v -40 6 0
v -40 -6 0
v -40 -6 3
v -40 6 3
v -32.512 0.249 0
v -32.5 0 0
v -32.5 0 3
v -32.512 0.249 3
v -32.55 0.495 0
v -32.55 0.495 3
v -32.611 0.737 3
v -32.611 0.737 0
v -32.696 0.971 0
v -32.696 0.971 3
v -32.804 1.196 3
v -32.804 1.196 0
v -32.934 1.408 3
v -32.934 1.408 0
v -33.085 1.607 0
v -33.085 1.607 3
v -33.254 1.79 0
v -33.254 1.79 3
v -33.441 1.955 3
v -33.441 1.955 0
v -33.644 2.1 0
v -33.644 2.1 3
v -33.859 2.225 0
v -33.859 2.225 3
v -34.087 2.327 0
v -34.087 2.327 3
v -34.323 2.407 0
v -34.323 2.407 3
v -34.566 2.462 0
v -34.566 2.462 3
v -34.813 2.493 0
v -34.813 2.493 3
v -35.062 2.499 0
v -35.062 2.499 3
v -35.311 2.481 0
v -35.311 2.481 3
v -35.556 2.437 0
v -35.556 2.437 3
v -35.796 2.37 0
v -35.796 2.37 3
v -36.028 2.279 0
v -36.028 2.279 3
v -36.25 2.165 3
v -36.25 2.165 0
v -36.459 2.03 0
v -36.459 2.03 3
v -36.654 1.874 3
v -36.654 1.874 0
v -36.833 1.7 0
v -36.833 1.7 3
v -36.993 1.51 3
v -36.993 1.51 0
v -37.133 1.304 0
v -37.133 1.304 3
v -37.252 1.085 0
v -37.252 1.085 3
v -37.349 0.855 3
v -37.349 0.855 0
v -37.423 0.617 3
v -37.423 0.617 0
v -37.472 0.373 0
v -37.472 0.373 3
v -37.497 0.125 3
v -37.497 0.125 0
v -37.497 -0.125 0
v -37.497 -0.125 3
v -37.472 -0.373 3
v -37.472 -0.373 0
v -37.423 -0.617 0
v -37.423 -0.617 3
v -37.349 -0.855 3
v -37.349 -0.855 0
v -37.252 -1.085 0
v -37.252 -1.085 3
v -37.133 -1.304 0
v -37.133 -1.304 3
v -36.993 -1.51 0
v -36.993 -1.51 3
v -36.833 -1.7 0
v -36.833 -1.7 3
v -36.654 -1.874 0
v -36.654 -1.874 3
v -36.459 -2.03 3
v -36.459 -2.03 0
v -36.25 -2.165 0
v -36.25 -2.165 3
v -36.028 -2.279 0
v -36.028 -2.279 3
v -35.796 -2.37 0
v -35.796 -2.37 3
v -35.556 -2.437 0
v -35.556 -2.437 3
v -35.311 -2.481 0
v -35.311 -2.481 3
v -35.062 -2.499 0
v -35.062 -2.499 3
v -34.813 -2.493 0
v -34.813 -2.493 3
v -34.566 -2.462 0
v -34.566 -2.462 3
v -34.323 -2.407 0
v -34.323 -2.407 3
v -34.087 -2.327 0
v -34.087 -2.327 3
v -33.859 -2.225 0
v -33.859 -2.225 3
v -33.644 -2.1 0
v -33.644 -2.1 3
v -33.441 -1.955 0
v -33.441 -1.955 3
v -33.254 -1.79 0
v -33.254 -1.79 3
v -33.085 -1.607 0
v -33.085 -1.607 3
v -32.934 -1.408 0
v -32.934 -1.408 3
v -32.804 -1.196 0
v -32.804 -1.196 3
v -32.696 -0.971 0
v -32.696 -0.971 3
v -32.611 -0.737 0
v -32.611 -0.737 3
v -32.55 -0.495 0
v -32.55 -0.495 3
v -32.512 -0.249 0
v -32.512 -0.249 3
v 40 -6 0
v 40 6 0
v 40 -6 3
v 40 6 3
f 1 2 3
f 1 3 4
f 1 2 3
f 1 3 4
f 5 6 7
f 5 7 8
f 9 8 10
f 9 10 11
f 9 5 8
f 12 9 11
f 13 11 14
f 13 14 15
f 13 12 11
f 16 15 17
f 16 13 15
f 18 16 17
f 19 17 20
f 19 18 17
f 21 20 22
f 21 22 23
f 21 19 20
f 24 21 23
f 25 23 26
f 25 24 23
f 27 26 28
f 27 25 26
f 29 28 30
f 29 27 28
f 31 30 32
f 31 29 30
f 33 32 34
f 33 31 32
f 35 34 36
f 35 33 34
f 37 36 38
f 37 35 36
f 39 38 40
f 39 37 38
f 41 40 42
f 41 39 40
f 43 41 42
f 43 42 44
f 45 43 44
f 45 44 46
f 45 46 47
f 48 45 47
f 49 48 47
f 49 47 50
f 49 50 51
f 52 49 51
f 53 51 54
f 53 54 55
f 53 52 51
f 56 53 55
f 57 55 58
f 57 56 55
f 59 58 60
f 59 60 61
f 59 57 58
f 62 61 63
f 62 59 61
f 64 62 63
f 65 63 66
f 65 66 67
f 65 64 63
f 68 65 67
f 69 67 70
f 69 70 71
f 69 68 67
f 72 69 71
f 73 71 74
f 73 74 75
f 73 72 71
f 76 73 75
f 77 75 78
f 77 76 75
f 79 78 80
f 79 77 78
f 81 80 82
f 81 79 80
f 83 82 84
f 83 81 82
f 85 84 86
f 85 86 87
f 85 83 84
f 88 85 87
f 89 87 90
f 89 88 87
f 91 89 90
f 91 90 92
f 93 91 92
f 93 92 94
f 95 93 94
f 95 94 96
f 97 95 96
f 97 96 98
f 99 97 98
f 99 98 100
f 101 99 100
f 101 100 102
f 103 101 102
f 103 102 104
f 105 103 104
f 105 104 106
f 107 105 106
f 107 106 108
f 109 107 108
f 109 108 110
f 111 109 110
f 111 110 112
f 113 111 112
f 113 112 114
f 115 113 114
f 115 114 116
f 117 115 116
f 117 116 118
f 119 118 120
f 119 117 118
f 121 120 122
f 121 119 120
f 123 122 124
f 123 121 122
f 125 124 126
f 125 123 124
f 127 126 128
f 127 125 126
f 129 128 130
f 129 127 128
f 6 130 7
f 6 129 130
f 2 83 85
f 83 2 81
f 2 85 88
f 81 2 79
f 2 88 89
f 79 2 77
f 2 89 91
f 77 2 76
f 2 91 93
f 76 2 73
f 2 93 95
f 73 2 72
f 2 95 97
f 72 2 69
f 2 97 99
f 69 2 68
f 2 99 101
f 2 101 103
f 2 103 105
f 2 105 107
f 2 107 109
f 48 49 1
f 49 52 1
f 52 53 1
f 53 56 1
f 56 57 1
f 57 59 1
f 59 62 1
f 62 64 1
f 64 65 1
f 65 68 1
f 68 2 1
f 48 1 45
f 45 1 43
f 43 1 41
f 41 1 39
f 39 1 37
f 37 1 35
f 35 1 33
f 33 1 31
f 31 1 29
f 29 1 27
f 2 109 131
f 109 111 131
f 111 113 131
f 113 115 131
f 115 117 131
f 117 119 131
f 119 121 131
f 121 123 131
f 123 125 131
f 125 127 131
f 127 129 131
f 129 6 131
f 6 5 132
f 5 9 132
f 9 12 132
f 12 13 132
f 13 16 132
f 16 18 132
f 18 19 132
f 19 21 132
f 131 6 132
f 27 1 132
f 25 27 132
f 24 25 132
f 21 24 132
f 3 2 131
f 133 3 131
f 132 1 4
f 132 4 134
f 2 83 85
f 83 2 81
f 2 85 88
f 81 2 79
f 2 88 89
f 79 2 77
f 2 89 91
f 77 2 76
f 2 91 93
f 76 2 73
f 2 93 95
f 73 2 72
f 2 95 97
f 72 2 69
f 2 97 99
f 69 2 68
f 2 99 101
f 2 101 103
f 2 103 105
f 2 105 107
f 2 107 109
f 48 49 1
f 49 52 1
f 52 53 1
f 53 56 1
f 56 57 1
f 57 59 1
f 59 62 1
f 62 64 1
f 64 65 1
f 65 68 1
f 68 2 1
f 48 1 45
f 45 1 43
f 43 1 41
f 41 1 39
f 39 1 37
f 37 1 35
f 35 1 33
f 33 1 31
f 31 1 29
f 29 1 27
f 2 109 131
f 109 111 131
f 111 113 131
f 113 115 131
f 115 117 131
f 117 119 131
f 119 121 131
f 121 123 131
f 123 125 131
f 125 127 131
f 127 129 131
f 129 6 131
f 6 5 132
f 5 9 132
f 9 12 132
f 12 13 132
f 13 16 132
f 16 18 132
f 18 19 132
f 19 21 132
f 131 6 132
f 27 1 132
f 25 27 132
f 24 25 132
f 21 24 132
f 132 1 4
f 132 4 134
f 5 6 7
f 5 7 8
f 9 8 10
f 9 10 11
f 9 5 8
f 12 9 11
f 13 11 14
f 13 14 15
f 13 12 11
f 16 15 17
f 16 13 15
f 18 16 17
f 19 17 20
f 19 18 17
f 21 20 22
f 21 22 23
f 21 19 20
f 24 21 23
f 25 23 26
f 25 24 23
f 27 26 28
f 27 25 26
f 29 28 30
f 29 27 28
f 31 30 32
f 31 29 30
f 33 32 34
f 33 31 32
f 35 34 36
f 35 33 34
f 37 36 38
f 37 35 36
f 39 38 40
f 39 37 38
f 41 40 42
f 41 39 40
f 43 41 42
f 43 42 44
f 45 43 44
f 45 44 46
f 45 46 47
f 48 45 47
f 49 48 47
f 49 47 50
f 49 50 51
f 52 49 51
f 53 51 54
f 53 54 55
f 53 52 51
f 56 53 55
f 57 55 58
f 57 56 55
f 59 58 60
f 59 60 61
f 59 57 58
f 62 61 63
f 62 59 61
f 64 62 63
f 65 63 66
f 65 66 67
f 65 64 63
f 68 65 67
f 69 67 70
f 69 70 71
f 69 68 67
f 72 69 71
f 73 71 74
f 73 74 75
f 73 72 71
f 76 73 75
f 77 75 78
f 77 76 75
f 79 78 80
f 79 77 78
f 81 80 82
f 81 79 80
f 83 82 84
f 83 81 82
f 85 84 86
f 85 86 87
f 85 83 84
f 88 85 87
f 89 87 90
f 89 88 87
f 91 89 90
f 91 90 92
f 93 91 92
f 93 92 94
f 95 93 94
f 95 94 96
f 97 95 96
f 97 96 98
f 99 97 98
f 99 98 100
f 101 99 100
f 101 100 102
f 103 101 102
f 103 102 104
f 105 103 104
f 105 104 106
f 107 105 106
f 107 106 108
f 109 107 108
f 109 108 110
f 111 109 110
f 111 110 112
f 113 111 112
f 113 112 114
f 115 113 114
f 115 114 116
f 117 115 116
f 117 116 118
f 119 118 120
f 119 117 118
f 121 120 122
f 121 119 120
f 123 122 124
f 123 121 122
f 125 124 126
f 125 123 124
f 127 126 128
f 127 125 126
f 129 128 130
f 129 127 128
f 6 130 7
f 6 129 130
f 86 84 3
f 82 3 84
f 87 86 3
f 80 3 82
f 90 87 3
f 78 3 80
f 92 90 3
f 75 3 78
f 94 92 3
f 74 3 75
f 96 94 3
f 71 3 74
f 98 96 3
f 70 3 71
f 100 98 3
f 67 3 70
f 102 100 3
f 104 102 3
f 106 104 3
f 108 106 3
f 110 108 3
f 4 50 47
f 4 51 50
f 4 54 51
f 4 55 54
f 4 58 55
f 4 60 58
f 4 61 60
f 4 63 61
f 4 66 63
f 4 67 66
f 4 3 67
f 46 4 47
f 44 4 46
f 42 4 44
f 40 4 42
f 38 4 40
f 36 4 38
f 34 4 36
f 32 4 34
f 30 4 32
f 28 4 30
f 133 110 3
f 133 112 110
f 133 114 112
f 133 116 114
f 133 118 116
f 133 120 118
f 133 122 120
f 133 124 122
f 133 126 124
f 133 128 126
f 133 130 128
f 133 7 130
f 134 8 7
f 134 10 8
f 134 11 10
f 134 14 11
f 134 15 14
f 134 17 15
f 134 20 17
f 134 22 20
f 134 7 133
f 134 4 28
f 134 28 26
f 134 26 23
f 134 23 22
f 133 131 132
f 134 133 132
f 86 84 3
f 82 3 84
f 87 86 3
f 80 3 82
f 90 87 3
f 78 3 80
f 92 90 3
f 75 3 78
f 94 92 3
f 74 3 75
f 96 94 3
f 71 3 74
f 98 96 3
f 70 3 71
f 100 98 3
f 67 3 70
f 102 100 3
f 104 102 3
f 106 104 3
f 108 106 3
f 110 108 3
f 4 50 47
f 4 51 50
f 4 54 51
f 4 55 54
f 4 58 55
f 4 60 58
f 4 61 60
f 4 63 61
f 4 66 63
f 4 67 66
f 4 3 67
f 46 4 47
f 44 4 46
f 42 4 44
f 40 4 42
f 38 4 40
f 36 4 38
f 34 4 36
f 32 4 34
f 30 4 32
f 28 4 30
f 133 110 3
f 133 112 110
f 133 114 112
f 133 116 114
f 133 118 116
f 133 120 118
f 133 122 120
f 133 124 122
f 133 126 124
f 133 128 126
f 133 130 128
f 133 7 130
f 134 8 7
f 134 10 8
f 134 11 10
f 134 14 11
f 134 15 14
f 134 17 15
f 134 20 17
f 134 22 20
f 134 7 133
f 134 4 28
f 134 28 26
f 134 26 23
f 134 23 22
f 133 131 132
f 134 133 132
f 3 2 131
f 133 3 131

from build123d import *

# Parameters (mm, degrees)
SKETCH_W         = 80
SKETCH_H         = 12
SKETCH_R         = 2.5
EXTRUDE_DEPTH    = 3
EXTRUDE001_DEPTH = 3


with BuildPart() as extrude_body:
    # Sketch → Extrude (new body)
    with BuildSketch(Plane.XY):
        Rectangle(SKETCH_W, SKETCH_H)
        with Locations((-35, 0)):
            Circle(SKETCH_R, mode=Mode.SUBTRACT)
    extrude(amount=EXTRUDE_DEPTH)


with BuildPart() as extrude001:
    # Sketch → Extrude001 (new body)
    with BuildSketch(Plane.XY):
        Rectangle(SKETCH_W, SKETCH_H)
        with Locations((-35, 0)):
            Circle(SKETCH_R, mode=Mode.SUBTRACT)
    extrude(amount=EXTRUDE001_DEPTH)


solid = Compound([extrude_body.part, extrude001.part])
